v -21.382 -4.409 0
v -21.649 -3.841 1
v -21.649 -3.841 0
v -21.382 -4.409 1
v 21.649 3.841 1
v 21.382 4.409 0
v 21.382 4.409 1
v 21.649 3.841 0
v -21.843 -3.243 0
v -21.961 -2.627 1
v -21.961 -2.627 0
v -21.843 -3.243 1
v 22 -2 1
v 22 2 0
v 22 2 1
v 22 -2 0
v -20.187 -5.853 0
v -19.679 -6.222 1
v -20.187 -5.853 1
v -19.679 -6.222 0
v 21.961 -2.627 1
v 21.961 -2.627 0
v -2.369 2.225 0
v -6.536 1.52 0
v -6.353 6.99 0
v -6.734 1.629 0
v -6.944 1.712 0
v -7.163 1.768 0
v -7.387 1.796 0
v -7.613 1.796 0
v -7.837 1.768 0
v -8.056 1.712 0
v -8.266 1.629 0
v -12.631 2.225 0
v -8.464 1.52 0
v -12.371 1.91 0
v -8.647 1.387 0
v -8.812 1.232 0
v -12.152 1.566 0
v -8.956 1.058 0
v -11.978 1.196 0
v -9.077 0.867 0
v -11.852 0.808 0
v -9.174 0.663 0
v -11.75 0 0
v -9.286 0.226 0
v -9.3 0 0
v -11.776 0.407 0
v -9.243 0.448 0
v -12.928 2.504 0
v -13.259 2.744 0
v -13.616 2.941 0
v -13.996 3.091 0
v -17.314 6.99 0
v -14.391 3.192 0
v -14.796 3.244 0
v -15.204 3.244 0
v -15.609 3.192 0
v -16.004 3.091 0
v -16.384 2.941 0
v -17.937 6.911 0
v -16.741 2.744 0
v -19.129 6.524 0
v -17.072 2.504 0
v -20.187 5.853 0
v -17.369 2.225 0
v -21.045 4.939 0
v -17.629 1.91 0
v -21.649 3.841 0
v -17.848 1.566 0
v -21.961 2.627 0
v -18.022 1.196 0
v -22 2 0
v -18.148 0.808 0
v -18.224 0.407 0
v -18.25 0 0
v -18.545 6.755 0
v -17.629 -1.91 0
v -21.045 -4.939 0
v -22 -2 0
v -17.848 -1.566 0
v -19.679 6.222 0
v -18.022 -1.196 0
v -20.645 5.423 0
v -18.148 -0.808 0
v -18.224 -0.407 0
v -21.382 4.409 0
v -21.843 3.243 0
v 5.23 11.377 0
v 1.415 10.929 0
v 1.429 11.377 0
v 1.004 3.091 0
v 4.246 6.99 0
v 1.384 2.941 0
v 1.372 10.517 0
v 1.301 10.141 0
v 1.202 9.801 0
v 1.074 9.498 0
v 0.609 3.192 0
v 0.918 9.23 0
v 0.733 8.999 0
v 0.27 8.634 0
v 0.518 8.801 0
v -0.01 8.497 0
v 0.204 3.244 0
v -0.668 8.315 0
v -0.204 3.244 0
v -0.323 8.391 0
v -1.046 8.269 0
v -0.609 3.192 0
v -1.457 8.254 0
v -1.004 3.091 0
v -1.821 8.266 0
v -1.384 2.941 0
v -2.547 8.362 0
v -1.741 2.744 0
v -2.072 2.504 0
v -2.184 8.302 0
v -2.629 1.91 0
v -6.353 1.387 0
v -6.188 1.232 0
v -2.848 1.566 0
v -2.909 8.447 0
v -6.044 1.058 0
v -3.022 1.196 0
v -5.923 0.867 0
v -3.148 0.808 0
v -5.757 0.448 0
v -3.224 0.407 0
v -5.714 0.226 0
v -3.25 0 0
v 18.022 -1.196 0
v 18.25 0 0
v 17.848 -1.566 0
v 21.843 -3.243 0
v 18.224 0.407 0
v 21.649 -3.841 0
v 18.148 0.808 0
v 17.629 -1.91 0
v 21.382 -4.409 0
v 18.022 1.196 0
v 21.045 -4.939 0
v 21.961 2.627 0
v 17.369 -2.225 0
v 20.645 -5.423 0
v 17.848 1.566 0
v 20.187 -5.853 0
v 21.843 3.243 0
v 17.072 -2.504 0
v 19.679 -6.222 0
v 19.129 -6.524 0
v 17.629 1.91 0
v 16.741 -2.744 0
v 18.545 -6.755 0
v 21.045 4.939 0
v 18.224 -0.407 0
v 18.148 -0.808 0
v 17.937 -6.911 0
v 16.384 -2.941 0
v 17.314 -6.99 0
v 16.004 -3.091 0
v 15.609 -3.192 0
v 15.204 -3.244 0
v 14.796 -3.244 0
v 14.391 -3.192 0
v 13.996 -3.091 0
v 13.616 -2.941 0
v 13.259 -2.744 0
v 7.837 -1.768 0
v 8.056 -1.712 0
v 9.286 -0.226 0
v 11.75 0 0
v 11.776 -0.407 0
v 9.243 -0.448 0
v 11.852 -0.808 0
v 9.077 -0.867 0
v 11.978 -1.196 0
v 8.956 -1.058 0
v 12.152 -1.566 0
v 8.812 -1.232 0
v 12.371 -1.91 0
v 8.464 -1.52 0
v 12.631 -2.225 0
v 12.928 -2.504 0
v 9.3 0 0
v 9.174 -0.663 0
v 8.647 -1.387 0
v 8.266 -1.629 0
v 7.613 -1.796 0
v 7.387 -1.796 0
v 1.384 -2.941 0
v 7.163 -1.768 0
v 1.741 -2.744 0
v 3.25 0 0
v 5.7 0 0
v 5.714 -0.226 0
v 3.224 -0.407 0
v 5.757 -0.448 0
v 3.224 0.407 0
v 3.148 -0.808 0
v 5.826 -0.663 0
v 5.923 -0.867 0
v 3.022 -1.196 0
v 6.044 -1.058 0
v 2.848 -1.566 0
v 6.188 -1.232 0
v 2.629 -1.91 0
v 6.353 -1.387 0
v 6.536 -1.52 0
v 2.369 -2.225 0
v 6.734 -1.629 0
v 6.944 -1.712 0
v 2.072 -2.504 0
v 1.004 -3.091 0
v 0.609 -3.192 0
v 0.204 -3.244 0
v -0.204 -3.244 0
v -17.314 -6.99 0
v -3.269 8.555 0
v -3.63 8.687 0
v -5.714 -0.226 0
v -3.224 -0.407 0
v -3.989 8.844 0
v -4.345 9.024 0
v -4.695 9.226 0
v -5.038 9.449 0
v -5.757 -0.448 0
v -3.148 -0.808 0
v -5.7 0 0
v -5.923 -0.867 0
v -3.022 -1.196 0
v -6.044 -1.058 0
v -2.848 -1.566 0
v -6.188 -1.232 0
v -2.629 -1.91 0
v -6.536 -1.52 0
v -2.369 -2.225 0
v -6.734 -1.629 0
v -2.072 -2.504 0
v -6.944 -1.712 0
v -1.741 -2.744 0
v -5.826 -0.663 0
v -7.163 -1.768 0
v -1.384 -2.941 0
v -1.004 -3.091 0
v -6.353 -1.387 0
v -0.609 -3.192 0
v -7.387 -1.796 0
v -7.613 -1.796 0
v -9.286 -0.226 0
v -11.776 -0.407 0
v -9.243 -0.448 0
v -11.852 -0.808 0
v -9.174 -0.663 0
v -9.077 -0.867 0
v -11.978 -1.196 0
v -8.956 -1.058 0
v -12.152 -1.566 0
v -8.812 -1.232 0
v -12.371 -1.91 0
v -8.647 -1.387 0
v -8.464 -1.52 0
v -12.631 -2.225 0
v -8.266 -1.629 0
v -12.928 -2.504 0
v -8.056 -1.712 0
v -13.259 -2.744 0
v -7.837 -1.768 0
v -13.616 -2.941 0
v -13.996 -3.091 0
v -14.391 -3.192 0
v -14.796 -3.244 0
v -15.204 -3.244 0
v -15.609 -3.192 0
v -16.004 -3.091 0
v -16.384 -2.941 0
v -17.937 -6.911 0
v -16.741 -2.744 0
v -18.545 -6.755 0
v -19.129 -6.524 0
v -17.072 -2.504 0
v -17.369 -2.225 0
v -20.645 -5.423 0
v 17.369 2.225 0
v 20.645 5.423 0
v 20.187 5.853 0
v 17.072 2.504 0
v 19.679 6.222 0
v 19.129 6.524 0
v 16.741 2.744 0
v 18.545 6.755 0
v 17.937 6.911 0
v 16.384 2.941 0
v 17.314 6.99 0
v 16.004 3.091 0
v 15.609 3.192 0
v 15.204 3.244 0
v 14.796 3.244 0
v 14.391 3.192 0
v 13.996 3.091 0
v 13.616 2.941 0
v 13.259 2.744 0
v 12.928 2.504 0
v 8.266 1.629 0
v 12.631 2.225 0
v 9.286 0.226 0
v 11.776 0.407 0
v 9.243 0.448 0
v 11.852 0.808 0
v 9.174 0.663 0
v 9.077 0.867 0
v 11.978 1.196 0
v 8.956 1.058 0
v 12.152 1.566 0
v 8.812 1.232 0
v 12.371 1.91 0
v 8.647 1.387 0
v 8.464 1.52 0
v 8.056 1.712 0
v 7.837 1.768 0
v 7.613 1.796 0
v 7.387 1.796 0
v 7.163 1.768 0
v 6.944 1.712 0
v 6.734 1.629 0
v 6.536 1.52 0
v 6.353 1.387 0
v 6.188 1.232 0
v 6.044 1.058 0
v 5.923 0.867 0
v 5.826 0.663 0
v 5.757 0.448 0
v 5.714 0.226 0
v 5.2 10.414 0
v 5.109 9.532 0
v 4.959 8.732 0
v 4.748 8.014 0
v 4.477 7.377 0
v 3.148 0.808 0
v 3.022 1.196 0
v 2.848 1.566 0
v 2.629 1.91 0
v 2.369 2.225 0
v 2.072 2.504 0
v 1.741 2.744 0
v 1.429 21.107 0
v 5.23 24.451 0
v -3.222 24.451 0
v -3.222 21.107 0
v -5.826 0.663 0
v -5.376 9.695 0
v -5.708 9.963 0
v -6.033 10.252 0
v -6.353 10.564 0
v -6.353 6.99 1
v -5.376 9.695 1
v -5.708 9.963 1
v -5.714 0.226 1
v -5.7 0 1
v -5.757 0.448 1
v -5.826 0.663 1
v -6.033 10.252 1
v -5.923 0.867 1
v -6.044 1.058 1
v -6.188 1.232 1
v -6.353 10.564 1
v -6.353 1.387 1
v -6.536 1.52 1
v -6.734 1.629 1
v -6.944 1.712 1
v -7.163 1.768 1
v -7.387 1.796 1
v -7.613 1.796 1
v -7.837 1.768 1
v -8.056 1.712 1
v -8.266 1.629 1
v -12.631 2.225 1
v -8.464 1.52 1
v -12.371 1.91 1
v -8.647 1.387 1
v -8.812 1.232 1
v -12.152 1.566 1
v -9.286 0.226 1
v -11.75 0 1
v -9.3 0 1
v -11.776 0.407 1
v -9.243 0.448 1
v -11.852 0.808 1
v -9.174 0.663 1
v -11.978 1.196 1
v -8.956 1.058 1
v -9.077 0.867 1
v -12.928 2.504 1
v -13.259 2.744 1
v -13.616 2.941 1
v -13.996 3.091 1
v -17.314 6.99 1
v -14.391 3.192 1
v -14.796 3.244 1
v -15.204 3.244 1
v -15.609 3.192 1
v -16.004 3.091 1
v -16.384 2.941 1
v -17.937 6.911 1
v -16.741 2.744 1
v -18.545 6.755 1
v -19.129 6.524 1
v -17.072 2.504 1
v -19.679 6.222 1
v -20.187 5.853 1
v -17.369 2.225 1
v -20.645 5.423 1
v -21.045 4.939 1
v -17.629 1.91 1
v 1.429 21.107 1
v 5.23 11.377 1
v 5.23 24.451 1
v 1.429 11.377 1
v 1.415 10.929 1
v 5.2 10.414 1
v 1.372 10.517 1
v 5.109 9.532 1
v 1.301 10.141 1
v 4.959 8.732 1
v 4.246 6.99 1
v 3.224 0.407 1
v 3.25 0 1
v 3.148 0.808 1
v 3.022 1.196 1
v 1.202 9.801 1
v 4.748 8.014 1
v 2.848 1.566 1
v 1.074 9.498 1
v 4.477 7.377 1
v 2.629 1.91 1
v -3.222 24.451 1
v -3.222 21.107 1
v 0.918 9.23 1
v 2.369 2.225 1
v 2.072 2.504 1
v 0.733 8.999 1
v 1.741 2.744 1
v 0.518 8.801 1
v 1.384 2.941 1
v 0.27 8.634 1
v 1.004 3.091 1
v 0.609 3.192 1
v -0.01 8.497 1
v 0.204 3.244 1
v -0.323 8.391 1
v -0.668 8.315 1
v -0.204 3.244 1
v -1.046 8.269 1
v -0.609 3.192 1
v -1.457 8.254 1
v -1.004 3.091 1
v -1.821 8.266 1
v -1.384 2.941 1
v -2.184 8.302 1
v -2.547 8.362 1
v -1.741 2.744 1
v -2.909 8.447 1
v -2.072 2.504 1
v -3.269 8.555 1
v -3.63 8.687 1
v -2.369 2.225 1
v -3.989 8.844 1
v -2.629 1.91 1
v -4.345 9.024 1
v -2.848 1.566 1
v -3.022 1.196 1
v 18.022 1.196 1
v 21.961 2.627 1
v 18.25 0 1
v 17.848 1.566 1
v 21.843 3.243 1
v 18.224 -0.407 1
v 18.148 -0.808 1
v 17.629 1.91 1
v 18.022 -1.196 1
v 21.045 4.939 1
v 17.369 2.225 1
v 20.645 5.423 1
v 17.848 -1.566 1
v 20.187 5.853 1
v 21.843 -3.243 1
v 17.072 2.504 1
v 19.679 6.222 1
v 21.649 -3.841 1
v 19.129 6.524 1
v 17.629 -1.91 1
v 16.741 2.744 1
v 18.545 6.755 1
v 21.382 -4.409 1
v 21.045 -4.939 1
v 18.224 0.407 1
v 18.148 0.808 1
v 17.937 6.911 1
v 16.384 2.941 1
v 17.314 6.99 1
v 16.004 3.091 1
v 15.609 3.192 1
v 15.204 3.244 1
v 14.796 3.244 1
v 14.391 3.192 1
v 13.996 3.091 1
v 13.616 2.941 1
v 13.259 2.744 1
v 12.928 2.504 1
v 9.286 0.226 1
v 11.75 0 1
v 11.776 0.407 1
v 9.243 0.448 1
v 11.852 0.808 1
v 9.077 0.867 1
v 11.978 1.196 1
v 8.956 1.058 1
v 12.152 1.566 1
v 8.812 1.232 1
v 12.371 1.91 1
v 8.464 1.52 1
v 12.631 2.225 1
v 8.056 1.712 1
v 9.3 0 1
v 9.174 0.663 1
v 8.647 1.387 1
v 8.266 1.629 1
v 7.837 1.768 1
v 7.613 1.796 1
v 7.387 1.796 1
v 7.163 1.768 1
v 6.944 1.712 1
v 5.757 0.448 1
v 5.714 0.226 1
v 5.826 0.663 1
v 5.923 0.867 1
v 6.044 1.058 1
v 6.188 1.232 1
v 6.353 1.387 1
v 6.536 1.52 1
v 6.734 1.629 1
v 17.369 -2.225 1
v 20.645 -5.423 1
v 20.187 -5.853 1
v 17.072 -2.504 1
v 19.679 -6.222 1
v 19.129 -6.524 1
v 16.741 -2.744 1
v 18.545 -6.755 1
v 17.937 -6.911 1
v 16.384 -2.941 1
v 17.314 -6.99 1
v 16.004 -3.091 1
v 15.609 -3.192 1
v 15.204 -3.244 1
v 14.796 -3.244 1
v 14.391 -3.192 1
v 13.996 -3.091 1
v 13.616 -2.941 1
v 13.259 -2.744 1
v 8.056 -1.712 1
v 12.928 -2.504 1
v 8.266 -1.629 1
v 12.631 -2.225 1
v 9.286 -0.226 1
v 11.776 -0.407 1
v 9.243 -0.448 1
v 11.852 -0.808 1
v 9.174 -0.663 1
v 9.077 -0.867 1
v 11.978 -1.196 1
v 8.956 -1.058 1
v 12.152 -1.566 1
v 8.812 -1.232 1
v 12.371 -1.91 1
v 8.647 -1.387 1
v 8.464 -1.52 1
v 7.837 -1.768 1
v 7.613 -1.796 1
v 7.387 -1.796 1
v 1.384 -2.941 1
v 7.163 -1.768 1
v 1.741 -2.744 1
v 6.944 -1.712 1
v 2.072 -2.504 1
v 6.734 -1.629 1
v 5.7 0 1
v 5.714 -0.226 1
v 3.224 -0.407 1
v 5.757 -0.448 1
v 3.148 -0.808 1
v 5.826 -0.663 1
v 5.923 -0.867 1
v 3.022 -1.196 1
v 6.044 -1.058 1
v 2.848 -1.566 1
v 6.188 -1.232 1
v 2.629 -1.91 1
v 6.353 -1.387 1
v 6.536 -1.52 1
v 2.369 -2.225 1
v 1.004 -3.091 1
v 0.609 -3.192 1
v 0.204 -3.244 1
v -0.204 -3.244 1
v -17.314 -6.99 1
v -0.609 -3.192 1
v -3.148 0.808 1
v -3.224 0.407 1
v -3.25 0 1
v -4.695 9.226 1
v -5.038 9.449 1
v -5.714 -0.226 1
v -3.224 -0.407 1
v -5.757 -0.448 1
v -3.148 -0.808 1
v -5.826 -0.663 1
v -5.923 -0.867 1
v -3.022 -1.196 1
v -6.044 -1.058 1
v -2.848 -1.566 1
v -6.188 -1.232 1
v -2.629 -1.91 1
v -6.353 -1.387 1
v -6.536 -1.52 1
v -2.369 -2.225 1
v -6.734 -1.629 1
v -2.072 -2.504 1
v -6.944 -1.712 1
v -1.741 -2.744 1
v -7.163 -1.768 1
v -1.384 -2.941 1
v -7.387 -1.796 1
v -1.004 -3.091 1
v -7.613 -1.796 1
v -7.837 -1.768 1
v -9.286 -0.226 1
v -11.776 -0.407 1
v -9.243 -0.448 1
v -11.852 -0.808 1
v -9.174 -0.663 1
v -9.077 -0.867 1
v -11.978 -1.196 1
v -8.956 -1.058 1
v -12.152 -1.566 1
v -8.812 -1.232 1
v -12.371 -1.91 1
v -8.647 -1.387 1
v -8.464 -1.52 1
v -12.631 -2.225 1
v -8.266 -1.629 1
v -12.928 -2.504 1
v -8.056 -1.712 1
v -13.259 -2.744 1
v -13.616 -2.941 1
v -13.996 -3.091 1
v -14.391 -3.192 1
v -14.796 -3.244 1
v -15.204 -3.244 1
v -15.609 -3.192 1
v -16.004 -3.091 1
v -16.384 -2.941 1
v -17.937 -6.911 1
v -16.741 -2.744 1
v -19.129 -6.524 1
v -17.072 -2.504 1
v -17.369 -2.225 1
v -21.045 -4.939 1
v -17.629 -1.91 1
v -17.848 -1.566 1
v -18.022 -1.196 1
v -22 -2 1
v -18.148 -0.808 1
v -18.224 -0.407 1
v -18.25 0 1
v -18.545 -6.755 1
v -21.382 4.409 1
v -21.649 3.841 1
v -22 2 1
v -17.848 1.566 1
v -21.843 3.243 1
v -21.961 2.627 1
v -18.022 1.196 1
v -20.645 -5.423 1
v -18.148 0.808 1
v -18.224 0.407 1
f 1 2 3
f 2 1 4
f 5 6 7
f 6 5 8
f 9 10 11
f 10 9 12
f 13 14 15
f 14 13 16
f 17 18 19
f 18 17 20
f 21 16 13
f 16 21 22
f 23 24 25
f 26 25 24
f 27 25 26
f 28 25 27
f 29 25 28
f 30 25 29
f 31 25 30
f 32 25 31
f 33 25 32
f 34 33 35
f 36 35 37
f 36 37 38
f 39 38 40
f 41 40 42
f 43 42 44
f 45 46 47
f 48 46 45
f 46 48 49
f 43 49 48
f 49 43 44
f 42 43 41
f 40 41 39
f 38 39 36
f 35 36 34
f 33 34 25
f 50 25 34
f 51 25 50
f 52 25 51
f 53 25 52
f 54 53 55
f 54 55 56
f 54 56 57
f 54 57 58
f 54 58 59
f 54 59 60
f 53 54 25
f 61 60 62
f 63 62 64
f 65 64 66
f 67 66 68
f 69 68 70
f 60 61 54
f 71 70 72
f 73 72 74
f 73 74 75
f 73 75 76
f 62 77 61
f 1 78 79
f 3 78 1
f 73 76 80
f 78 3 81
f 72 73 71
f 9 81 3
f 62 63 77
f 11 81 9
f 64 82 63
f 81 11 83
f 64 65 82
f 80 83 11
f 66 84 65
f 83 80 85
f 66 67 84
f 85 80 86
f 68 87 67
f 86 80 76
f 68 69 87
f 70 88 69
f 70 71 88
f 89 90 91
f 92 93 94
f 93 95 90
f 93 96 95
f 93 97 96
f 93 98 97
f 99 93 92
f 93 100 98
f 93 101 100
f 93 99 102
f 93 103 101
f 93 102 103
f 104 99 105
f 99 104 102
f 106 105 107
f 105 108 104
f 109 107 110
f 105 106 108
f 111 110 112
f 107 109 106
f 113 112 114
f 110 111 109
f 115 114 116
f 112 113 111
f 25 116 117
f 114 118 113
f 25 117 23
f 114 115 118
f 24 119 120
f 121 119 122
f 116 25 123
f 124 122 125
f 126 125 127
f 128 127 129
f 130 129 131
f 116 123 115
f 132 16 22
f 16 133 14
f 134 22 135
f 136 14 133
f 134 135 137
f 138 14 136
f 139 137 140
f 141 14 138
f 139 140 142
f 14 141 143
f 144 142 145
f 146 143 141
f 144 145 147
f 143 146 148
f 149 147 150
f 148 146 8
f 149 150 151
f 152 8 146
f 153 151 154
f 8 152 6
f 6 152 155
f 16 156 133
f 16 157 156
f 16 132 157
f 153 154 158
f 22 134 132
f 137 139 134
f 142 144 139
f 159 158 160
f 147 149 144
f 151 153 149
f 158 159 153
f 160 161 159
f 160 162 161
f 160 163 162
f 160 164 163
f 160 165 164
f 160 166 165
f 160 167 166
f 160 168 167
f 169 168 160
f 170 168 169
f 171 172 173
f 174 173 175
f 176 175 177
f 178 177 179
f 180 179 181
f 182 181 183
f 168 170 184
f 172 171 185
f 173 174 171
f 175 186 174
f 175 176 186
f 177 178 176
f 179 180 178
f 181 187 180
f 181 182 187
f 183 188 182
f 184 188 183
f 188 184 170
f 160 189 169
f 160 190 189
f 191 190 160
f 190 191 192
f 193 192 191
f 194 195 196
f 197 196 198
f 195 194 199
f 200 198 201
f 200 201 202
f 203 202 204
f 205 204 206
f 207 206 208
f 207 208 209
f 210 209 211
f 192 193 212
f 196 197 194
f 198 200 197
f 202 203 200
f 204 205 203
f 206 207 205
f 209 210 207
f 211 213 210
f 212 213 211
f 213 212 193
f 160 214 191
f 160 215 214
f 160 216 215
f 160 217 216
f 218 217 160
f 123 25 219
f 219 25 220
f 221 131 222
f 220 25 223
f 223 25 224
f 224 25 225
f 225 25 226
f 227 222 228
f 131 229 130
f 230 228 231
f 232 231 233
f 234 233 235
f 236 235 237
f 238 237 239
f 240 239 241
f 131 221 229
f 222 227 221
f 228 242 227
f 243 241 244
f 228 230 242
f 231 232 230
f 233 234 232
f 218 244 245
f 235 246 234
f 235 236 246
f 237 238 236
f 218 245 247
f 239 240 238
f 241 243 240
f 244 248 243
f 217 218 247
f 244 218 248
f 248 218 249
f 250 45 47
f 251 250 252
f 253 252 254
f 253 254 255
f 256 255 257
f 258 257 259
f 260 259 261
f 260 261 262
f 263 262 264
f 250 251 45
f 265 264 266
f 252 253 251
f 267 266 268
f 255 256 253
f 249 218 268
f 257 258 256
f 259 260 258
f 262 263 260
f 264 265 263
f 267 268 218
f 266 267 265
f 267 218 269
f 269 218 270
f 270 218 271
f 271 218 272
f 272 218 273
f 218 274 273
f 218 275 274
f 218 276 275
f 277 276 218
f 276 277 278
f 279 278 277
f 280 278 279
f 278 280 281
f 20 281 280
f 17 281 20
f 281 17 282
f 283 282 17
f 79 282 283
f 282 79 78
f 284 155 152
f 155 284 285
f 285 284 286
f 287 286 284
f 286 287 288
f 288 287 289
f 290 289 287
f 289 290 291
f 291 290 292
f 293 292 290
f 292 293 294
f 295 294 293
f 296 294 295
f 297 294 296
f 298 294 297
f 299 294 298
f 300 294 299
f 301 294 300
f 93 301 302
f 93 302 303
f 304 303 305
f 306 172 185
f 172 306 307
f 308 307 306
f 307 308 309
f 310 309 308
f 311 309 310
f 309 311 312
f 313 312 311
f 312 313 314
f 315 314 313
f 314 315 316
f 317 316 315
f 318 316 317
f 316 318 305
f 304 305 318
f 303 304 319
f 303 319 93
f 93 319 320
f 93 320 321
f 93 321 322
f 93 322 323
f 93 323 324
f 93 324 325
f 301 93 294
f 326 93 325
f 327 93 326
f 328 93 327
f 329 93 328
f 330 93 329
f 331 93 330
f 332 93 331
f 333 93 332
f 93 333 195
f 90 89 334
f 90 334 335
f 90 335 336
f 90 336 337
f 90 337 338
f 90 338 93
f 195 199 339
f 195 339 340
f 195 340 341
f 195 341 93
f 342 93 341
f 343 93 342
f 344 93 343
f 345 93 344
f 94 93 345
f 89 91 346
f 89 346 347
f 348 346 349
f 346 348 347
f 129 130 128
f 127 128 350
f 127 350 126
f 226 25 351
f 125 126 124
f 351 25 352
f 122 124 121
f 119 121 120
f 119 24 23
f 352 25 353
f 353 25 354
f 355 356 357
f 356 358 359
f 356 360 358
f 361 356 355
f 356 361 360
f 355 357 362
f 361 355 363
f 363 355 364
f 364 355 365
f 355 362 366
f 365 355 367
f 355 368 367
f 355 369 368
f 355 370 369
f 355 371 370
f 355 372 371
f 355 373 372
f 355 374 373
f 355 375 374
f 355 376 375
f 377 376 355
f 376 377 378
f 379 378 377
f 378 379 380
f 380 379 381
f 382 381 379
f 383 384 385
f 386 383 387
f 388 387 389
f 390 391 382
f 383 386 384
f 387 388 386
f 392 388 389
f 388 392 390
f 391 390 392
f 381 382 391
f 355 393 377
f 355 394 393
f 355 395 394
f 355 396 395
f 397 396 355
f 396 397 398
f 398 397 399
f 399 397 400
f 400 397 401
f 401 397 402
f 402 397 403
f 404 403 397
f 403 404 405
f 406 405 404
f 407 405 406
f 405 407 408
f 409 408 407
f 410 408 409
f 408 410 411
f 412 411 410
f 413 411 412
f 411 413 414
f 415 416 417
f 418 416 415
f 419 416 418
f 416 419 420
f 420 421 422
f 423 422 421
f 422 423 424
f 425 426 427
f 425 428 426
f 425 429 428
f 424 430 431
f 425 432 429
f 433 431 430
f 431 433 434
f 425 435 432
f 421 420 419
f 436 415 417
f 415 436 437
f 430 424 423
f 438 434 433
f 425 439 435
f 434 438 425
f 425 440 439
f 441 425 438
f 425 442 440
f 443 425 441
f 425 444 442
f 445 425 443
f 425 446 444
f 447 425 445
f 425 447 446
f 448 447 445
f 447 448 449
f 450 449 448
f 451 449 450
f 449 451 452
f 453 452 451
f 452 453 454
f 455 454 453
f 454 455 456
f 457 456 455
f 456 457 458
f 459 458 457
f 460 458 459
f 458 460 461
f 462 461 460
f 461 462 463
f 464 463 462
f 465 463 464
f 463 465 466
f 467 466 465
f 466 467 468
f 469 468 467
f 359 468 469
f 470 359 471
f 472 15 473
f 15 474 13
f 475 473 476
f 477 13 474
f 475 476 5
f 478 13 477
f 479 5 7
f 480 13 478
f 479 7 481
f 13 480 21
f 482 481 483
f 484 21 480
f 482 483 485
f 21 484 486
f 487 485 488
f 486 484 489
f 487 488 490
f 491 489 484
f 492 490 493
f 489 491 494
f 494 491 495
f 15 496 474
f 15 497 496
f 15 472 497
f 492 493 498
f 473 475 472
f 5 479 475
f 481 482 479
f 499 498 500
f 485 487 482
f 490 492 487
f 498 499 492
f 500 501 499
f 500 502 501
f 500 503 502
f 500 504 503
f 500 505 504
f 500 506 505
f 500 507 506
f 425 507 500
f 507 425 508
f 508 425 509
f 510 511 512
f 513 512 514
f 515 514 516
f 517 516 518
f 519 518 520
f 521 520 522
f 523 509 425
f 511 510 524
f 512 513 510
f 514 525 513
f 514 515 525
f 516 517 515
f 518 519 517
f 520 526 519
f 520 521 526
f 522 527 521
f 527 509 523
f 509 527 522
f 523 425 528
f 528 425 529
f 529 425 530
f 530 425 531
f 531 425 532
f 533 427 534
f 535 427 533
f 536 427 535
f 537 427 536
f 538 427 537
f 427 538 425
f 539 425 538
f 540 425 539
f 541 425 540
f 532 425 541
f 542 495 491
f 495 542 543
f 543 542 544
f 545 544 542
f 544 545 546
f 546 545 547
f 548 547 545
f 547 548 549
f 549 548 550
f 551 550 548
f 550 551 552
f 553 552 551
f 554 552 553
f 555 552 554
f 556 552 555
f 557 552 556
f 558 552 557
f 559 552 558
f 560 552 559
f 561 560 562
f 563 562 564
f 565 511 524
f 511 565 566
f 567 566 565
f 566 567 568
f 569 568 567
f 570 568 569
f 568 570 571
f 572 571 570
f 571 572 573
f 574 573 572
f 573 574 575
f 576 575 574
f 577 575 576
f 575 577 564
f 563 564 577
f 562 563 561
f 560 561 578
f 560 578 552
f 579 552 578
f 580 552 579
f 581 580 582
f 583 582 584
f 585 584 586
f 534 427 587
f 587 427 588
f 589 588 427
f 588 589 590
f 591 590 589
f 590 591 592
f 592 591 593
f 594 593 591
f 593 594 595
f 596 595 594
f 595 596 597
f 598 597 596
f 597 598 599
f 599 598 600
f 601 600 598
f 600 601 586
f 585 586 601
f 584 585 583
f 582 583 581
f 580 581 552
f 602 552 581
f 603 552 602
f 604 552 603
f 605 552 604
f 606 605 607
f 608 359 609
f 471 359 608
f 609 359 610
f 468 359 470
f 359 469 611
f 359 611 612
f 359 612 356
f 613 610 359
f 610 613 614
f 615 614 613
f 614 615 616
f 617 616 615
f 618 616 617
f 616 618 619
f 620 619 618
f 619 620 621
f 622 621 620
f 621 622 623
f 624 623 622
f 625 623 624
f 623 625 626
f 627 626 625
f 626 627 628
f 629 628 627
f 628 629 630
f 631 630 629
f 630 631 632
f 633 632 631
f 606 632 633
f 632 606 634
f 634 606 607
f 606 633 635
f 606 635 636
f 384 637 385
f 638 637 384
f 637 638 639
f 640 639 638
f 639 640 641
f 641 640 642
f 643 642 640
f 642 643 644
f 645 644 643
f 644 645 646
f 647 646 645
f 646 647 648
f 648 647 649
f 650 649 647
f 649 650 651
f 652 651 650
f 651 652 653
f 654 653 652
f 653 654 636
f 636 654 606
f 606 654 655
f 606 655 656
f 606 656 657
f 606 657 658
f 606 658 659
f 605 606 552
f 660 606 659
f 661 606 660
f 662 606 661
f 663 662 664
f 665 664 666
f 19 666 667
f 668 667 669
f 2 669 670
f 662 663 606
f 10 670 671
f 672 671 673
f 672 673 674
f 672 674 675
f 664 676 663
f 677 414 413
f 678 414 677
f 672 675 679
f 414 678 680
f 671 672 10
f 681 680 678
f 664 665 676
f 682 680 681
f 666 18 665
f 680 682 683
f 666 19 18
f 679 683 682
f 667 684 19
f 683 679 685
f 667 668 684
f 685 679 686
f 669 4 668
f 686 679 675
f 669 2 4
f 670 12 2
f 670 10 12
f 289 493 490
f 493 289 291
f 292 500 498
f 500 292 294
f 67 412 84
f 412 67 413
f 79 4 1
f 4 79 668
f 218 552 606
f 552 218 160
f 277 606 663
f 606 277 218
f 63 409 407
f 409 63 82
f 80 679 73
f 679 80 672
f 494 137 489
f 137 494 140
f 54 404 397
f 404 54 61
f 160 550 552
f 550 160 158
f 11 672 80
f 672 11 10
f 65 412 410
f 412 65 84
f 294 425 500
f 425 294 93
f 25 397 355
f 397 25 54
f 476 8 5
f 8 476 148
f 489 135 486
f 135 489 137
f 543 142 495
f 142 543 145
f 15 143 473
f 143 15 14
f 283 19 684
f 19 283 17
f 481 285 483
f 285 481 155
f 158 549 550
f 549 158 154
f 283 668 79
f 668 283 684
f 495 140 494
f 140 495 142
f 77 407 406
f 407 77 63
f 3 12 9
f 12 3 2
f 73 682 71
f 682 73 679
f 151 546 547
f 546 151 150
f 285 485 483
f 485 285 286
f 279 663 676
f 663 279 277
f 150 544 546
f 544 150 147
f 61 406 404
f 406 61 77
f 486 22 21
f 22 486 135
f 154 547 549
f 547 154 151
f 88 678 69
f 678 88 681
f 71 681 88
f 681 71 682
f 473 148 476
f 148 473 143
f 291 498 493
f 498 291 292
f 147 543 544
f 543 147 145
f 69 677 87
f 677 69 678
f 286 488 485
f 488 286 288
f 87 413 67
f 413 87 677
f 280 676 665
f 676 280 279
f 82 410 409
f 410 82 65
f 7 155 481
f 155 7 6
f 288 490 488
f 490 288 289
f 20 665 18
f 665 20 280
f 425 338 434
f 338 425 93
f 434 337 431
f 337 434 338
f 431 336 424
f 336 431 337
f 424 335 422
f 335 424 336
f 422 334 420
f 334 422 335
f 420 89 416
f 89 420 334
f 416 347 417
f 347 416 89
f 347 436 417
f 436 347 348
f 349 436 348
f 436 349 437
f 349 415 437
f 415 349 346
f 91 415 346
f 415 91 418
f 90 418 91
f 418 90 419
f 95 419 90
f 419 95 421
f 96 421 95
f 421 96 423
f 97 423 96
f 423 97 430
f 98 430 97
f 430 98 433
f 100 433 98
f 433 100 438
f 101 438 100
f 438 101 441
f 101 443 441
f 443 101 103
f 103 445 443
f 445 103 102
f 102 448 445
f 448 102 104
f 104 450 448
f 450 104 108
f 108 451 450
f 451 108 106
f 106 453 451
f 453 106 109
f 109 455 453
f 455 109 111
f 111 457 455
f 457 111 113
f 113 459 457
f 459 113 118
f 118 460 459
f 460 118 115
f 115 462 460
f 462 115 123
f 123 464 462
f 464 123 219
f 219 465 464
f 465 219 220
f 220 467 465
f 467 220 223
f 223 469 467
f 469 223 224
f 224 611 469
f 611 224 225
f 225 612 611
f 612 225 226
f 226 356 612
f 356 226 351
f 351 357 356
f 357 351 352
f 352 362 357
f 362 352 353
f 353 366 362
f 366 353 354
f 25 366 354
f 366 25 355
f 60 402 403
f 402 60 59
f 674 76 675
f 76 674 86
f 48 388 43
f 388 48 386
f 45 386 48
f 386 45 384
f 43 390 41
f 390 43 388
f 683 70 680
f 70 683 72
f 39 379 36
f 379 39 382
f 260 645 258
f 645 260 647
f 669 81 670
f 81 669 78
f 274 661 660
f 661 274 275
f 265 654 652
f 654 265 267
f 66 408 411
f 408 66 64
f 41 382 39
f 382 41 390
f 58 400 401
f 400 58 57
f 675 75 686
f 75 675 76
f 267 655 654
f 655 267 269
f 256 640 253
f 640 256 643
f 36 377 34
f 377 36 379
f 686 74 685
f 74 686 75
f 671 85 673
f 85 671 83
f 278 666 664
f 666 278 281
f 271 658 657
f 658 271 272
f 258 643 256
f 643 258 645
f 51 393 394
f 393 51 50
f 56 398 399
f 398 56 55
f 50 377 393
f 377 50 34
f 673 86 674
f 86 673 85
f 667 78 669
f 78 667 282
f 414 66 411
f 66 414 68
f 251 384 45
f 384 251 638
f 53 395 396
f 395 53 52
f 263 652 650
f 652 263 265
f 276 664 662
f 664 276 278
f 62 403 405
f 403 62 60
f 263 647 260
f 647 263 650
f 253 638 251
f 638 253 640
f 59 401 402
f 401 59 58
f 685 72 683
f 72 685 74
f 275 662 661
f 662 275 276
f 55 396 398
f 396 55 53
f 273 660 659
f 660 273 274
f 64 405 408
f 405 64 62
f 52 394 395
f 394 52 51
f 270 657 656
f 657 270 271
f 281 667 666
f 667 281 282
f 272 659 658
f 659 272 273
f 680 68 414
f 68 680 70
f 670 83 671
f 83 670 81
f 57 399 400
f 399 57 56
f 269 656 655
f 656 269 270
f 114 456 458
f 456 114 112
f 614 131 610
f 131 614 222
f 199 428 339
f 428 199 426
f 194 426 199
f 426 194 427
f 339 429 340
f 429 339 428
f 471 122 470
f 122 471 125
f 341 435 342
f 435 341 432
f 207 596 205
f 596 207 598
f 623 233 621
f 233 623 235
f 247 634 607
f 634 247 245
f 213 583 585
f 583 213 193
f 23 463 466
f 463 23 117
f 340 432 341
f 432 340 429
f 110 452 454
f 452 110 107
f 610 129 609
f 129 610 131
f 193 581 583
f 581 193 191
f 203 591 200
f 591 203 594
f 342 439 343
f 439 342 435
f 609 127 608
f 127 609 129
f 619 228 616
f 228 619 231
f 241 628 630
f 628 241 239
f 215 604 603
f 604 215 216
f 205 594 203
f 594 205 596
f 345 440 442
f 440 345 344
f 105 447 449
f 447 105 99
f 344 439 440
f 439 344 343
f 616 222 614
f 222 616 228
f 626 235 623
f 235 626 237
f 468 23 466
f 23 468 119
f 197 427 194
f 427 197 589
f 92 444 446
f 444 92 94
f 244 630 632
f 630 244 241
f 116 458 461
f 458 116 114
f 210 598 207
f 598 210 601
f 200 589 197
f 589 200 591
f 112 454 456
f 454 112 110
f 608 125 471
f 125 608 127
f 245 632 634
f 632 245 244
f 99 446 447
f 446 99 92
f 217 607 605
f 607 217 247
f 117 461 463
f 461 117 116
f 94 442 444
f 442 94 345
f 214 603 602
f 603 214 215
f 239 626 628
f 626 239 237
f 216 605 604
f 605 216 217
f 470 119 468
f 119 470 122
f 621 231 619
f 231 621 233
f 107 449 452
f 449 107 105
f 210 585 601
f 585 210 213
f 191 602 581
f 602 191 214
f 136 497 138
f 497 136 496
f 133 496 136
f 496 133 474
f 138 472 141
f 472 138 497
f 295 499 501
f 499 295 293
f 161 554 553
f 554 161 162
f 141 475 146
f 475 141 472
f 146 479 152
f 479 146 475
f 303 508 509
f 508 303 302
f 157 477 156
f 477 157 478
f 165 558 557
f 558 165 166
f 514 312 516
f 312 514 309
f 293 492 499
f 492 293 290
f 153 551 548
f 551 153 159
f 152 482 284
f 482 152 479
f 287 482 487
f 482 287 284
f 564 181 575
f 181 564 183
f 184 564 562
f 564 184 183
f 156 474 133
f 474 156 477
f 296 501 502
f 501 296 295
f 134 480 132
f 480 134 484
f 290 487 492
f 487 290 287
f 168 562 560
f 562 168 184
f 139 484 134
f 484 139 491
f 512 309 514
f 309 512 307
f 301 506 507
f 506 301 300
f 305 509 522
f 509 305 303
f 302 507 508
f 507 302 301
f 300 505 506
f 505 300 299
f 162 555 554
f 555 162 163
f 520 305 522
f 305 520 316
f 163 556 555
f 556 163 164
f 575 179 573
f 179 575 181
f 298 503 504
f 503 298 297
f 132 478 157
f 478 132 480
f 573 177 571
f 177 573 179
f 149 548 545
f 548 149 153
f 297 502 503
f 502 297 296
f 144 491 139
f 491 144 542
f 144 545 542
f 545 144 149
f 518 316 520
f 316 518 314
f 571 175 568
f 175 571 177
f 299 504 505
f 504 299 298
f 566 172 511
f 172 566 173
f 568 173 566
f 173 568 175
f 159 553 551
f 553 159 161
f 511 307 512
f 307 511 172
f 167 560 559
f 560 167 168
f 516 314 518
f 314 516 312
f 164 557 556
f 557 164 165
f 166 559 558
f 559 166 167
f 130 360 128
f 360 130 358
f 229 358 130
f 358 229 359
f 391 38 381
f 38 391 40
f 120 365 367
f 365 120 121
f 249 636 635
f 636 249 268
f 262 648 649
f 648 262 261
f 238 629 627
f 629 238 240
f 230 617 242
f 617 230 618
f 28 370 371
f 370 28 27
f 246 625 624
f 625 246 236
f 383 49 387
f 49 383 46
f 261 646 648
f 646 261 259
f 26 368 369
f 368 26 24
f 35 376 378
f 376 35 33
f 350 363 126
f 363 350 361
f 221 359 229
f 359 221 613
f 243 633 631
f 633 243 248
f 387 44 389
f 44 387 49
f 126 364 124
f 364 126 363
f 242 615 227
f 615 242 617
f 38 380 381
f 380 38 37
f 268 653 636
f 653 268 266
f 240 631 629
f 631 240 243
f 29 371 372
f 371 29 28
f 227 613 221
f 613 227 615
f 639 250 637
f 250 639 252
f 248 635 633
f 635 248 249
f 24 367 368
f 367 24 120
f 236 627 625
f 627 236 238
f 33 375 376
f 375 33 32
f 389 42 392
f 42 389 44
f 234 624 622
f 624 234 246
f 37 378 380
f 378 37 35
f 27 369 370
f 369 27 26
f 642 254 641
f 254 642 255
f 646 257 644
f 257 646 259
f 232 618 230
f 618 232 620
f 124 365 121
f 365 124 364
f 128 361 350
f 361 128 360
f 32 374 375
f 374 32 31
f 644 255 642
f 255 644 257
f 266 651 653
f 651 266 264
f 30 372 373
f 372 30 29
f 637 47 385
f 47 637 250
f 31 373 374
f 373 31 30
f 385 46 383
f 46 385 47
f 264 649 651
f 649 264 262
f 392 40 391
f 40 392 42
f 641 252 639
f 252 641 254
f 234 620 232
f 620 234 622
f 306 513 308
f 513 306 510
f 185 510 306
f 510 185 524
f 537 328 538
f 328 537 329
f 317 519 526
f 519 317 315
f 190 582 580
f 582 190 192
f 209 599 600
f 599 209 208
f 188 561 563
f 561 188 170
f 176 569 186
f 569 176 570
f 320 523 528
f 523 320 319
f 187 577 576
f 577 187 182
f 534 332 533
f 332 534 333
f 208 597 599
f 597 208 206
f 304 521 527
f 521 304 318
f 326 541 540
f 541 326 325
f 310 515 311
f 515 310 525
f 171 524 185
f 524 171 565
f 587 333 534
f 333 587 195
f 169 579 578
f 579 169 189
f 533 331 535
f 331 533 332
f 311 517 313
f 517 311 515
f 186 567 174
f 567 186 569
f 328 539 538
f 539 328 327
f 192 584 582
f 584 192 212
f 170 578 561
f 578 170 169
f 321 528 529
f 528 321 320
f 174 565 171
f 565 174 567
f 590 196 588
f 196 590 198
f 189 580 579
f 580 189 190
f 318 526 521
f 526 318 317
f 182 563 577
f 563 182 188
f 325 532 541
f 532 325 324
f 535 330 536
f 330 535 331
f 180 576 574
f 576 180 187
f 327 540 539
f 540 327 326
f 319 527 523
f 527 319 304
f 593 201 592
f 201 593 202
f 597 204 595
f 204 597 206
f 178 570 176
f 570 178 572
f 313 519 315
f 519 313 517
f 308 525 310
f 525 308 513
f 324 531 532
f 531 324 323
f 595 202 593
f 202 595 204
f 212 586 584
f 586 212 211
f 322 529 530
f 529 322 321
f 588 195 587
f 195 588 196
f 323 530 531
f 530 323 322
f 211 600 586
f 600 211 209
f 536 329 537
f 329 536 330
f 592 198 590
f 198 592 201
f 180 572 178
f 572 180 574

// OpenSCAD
$fn = 50;


difference() {
	union() {
		hull() {
			translate(v = [-17.0000000000, 2.0000000000, 0]) {
				cylinder(h = 1, r = 5);
			}
			translate(v = [17.0000000000, 2.0000000000, 0]) {
				cylinder(h = 1, r = 5);
			}
			translate(v = [-17.0000000000, -2.0000000000, 0]) {
				cylinder(h = 1, r = 5);
			}
			translate(v = [17.0000000000, -2.0000000000, 0]) {
				cylinder(h = 1, r = 5);
			}
		}
		translate(v = [0, 24, 0]) {
			linear_extrude(height = 1) {
				text(font = "DejaVu Sans Mono:style=Bold", halign = "center", size = 19.0000000000, text = "J", valign = "top");
			}
		}
	}
	union() {
		translate(v = [-15.0000000000, 0.0000000000, 0]) {
			translate(v = [0, 0, -100]) {
				cylinder(h = 200, r = 3.2500000000);
			}
		}
		translate(v = [0, 0, -100]) {
			cylinder(h = 200, r = 3.2500000000);
		}
		translate(v = [15.0000000000, 0.0000000000, 0]) {
			translate(v = [0, 0, -100]) {
				cylinder(h = 200, r = 3.2500000000);
			}
		}
		translate(v = [-15.0000000000, 0.0000000000, 0]) {
			translate(v = [0, 0, -100]) {
				cylinder(h = 200, r = 1.8000000000);
			}
		}
		translate(v = [-7.5000000000, 0.0000000000, 0]) {
			translate(v = [0, 0, -100]) {
				cylinder(h = 200, r = 1.8000000000);
			}
		}
		translate(v = [0, 0, -100]) {
			cylinder(h = 200, r = 1.8000000000);
		}
		translate(v = [7.5000000000, 0.0000000000, 0]) {
			translate(v = [0, 0, -100]) {
				cylinder(h = 200, r = 1.8000000000);
			}
		}
		translate(v = [15.0000000000, 0.0000000000, 0]) {
			translate(v = [0, 0, -100]) {
				cylinder(h = 200, r = 1.8000000000);
			}
		}
	}
}
